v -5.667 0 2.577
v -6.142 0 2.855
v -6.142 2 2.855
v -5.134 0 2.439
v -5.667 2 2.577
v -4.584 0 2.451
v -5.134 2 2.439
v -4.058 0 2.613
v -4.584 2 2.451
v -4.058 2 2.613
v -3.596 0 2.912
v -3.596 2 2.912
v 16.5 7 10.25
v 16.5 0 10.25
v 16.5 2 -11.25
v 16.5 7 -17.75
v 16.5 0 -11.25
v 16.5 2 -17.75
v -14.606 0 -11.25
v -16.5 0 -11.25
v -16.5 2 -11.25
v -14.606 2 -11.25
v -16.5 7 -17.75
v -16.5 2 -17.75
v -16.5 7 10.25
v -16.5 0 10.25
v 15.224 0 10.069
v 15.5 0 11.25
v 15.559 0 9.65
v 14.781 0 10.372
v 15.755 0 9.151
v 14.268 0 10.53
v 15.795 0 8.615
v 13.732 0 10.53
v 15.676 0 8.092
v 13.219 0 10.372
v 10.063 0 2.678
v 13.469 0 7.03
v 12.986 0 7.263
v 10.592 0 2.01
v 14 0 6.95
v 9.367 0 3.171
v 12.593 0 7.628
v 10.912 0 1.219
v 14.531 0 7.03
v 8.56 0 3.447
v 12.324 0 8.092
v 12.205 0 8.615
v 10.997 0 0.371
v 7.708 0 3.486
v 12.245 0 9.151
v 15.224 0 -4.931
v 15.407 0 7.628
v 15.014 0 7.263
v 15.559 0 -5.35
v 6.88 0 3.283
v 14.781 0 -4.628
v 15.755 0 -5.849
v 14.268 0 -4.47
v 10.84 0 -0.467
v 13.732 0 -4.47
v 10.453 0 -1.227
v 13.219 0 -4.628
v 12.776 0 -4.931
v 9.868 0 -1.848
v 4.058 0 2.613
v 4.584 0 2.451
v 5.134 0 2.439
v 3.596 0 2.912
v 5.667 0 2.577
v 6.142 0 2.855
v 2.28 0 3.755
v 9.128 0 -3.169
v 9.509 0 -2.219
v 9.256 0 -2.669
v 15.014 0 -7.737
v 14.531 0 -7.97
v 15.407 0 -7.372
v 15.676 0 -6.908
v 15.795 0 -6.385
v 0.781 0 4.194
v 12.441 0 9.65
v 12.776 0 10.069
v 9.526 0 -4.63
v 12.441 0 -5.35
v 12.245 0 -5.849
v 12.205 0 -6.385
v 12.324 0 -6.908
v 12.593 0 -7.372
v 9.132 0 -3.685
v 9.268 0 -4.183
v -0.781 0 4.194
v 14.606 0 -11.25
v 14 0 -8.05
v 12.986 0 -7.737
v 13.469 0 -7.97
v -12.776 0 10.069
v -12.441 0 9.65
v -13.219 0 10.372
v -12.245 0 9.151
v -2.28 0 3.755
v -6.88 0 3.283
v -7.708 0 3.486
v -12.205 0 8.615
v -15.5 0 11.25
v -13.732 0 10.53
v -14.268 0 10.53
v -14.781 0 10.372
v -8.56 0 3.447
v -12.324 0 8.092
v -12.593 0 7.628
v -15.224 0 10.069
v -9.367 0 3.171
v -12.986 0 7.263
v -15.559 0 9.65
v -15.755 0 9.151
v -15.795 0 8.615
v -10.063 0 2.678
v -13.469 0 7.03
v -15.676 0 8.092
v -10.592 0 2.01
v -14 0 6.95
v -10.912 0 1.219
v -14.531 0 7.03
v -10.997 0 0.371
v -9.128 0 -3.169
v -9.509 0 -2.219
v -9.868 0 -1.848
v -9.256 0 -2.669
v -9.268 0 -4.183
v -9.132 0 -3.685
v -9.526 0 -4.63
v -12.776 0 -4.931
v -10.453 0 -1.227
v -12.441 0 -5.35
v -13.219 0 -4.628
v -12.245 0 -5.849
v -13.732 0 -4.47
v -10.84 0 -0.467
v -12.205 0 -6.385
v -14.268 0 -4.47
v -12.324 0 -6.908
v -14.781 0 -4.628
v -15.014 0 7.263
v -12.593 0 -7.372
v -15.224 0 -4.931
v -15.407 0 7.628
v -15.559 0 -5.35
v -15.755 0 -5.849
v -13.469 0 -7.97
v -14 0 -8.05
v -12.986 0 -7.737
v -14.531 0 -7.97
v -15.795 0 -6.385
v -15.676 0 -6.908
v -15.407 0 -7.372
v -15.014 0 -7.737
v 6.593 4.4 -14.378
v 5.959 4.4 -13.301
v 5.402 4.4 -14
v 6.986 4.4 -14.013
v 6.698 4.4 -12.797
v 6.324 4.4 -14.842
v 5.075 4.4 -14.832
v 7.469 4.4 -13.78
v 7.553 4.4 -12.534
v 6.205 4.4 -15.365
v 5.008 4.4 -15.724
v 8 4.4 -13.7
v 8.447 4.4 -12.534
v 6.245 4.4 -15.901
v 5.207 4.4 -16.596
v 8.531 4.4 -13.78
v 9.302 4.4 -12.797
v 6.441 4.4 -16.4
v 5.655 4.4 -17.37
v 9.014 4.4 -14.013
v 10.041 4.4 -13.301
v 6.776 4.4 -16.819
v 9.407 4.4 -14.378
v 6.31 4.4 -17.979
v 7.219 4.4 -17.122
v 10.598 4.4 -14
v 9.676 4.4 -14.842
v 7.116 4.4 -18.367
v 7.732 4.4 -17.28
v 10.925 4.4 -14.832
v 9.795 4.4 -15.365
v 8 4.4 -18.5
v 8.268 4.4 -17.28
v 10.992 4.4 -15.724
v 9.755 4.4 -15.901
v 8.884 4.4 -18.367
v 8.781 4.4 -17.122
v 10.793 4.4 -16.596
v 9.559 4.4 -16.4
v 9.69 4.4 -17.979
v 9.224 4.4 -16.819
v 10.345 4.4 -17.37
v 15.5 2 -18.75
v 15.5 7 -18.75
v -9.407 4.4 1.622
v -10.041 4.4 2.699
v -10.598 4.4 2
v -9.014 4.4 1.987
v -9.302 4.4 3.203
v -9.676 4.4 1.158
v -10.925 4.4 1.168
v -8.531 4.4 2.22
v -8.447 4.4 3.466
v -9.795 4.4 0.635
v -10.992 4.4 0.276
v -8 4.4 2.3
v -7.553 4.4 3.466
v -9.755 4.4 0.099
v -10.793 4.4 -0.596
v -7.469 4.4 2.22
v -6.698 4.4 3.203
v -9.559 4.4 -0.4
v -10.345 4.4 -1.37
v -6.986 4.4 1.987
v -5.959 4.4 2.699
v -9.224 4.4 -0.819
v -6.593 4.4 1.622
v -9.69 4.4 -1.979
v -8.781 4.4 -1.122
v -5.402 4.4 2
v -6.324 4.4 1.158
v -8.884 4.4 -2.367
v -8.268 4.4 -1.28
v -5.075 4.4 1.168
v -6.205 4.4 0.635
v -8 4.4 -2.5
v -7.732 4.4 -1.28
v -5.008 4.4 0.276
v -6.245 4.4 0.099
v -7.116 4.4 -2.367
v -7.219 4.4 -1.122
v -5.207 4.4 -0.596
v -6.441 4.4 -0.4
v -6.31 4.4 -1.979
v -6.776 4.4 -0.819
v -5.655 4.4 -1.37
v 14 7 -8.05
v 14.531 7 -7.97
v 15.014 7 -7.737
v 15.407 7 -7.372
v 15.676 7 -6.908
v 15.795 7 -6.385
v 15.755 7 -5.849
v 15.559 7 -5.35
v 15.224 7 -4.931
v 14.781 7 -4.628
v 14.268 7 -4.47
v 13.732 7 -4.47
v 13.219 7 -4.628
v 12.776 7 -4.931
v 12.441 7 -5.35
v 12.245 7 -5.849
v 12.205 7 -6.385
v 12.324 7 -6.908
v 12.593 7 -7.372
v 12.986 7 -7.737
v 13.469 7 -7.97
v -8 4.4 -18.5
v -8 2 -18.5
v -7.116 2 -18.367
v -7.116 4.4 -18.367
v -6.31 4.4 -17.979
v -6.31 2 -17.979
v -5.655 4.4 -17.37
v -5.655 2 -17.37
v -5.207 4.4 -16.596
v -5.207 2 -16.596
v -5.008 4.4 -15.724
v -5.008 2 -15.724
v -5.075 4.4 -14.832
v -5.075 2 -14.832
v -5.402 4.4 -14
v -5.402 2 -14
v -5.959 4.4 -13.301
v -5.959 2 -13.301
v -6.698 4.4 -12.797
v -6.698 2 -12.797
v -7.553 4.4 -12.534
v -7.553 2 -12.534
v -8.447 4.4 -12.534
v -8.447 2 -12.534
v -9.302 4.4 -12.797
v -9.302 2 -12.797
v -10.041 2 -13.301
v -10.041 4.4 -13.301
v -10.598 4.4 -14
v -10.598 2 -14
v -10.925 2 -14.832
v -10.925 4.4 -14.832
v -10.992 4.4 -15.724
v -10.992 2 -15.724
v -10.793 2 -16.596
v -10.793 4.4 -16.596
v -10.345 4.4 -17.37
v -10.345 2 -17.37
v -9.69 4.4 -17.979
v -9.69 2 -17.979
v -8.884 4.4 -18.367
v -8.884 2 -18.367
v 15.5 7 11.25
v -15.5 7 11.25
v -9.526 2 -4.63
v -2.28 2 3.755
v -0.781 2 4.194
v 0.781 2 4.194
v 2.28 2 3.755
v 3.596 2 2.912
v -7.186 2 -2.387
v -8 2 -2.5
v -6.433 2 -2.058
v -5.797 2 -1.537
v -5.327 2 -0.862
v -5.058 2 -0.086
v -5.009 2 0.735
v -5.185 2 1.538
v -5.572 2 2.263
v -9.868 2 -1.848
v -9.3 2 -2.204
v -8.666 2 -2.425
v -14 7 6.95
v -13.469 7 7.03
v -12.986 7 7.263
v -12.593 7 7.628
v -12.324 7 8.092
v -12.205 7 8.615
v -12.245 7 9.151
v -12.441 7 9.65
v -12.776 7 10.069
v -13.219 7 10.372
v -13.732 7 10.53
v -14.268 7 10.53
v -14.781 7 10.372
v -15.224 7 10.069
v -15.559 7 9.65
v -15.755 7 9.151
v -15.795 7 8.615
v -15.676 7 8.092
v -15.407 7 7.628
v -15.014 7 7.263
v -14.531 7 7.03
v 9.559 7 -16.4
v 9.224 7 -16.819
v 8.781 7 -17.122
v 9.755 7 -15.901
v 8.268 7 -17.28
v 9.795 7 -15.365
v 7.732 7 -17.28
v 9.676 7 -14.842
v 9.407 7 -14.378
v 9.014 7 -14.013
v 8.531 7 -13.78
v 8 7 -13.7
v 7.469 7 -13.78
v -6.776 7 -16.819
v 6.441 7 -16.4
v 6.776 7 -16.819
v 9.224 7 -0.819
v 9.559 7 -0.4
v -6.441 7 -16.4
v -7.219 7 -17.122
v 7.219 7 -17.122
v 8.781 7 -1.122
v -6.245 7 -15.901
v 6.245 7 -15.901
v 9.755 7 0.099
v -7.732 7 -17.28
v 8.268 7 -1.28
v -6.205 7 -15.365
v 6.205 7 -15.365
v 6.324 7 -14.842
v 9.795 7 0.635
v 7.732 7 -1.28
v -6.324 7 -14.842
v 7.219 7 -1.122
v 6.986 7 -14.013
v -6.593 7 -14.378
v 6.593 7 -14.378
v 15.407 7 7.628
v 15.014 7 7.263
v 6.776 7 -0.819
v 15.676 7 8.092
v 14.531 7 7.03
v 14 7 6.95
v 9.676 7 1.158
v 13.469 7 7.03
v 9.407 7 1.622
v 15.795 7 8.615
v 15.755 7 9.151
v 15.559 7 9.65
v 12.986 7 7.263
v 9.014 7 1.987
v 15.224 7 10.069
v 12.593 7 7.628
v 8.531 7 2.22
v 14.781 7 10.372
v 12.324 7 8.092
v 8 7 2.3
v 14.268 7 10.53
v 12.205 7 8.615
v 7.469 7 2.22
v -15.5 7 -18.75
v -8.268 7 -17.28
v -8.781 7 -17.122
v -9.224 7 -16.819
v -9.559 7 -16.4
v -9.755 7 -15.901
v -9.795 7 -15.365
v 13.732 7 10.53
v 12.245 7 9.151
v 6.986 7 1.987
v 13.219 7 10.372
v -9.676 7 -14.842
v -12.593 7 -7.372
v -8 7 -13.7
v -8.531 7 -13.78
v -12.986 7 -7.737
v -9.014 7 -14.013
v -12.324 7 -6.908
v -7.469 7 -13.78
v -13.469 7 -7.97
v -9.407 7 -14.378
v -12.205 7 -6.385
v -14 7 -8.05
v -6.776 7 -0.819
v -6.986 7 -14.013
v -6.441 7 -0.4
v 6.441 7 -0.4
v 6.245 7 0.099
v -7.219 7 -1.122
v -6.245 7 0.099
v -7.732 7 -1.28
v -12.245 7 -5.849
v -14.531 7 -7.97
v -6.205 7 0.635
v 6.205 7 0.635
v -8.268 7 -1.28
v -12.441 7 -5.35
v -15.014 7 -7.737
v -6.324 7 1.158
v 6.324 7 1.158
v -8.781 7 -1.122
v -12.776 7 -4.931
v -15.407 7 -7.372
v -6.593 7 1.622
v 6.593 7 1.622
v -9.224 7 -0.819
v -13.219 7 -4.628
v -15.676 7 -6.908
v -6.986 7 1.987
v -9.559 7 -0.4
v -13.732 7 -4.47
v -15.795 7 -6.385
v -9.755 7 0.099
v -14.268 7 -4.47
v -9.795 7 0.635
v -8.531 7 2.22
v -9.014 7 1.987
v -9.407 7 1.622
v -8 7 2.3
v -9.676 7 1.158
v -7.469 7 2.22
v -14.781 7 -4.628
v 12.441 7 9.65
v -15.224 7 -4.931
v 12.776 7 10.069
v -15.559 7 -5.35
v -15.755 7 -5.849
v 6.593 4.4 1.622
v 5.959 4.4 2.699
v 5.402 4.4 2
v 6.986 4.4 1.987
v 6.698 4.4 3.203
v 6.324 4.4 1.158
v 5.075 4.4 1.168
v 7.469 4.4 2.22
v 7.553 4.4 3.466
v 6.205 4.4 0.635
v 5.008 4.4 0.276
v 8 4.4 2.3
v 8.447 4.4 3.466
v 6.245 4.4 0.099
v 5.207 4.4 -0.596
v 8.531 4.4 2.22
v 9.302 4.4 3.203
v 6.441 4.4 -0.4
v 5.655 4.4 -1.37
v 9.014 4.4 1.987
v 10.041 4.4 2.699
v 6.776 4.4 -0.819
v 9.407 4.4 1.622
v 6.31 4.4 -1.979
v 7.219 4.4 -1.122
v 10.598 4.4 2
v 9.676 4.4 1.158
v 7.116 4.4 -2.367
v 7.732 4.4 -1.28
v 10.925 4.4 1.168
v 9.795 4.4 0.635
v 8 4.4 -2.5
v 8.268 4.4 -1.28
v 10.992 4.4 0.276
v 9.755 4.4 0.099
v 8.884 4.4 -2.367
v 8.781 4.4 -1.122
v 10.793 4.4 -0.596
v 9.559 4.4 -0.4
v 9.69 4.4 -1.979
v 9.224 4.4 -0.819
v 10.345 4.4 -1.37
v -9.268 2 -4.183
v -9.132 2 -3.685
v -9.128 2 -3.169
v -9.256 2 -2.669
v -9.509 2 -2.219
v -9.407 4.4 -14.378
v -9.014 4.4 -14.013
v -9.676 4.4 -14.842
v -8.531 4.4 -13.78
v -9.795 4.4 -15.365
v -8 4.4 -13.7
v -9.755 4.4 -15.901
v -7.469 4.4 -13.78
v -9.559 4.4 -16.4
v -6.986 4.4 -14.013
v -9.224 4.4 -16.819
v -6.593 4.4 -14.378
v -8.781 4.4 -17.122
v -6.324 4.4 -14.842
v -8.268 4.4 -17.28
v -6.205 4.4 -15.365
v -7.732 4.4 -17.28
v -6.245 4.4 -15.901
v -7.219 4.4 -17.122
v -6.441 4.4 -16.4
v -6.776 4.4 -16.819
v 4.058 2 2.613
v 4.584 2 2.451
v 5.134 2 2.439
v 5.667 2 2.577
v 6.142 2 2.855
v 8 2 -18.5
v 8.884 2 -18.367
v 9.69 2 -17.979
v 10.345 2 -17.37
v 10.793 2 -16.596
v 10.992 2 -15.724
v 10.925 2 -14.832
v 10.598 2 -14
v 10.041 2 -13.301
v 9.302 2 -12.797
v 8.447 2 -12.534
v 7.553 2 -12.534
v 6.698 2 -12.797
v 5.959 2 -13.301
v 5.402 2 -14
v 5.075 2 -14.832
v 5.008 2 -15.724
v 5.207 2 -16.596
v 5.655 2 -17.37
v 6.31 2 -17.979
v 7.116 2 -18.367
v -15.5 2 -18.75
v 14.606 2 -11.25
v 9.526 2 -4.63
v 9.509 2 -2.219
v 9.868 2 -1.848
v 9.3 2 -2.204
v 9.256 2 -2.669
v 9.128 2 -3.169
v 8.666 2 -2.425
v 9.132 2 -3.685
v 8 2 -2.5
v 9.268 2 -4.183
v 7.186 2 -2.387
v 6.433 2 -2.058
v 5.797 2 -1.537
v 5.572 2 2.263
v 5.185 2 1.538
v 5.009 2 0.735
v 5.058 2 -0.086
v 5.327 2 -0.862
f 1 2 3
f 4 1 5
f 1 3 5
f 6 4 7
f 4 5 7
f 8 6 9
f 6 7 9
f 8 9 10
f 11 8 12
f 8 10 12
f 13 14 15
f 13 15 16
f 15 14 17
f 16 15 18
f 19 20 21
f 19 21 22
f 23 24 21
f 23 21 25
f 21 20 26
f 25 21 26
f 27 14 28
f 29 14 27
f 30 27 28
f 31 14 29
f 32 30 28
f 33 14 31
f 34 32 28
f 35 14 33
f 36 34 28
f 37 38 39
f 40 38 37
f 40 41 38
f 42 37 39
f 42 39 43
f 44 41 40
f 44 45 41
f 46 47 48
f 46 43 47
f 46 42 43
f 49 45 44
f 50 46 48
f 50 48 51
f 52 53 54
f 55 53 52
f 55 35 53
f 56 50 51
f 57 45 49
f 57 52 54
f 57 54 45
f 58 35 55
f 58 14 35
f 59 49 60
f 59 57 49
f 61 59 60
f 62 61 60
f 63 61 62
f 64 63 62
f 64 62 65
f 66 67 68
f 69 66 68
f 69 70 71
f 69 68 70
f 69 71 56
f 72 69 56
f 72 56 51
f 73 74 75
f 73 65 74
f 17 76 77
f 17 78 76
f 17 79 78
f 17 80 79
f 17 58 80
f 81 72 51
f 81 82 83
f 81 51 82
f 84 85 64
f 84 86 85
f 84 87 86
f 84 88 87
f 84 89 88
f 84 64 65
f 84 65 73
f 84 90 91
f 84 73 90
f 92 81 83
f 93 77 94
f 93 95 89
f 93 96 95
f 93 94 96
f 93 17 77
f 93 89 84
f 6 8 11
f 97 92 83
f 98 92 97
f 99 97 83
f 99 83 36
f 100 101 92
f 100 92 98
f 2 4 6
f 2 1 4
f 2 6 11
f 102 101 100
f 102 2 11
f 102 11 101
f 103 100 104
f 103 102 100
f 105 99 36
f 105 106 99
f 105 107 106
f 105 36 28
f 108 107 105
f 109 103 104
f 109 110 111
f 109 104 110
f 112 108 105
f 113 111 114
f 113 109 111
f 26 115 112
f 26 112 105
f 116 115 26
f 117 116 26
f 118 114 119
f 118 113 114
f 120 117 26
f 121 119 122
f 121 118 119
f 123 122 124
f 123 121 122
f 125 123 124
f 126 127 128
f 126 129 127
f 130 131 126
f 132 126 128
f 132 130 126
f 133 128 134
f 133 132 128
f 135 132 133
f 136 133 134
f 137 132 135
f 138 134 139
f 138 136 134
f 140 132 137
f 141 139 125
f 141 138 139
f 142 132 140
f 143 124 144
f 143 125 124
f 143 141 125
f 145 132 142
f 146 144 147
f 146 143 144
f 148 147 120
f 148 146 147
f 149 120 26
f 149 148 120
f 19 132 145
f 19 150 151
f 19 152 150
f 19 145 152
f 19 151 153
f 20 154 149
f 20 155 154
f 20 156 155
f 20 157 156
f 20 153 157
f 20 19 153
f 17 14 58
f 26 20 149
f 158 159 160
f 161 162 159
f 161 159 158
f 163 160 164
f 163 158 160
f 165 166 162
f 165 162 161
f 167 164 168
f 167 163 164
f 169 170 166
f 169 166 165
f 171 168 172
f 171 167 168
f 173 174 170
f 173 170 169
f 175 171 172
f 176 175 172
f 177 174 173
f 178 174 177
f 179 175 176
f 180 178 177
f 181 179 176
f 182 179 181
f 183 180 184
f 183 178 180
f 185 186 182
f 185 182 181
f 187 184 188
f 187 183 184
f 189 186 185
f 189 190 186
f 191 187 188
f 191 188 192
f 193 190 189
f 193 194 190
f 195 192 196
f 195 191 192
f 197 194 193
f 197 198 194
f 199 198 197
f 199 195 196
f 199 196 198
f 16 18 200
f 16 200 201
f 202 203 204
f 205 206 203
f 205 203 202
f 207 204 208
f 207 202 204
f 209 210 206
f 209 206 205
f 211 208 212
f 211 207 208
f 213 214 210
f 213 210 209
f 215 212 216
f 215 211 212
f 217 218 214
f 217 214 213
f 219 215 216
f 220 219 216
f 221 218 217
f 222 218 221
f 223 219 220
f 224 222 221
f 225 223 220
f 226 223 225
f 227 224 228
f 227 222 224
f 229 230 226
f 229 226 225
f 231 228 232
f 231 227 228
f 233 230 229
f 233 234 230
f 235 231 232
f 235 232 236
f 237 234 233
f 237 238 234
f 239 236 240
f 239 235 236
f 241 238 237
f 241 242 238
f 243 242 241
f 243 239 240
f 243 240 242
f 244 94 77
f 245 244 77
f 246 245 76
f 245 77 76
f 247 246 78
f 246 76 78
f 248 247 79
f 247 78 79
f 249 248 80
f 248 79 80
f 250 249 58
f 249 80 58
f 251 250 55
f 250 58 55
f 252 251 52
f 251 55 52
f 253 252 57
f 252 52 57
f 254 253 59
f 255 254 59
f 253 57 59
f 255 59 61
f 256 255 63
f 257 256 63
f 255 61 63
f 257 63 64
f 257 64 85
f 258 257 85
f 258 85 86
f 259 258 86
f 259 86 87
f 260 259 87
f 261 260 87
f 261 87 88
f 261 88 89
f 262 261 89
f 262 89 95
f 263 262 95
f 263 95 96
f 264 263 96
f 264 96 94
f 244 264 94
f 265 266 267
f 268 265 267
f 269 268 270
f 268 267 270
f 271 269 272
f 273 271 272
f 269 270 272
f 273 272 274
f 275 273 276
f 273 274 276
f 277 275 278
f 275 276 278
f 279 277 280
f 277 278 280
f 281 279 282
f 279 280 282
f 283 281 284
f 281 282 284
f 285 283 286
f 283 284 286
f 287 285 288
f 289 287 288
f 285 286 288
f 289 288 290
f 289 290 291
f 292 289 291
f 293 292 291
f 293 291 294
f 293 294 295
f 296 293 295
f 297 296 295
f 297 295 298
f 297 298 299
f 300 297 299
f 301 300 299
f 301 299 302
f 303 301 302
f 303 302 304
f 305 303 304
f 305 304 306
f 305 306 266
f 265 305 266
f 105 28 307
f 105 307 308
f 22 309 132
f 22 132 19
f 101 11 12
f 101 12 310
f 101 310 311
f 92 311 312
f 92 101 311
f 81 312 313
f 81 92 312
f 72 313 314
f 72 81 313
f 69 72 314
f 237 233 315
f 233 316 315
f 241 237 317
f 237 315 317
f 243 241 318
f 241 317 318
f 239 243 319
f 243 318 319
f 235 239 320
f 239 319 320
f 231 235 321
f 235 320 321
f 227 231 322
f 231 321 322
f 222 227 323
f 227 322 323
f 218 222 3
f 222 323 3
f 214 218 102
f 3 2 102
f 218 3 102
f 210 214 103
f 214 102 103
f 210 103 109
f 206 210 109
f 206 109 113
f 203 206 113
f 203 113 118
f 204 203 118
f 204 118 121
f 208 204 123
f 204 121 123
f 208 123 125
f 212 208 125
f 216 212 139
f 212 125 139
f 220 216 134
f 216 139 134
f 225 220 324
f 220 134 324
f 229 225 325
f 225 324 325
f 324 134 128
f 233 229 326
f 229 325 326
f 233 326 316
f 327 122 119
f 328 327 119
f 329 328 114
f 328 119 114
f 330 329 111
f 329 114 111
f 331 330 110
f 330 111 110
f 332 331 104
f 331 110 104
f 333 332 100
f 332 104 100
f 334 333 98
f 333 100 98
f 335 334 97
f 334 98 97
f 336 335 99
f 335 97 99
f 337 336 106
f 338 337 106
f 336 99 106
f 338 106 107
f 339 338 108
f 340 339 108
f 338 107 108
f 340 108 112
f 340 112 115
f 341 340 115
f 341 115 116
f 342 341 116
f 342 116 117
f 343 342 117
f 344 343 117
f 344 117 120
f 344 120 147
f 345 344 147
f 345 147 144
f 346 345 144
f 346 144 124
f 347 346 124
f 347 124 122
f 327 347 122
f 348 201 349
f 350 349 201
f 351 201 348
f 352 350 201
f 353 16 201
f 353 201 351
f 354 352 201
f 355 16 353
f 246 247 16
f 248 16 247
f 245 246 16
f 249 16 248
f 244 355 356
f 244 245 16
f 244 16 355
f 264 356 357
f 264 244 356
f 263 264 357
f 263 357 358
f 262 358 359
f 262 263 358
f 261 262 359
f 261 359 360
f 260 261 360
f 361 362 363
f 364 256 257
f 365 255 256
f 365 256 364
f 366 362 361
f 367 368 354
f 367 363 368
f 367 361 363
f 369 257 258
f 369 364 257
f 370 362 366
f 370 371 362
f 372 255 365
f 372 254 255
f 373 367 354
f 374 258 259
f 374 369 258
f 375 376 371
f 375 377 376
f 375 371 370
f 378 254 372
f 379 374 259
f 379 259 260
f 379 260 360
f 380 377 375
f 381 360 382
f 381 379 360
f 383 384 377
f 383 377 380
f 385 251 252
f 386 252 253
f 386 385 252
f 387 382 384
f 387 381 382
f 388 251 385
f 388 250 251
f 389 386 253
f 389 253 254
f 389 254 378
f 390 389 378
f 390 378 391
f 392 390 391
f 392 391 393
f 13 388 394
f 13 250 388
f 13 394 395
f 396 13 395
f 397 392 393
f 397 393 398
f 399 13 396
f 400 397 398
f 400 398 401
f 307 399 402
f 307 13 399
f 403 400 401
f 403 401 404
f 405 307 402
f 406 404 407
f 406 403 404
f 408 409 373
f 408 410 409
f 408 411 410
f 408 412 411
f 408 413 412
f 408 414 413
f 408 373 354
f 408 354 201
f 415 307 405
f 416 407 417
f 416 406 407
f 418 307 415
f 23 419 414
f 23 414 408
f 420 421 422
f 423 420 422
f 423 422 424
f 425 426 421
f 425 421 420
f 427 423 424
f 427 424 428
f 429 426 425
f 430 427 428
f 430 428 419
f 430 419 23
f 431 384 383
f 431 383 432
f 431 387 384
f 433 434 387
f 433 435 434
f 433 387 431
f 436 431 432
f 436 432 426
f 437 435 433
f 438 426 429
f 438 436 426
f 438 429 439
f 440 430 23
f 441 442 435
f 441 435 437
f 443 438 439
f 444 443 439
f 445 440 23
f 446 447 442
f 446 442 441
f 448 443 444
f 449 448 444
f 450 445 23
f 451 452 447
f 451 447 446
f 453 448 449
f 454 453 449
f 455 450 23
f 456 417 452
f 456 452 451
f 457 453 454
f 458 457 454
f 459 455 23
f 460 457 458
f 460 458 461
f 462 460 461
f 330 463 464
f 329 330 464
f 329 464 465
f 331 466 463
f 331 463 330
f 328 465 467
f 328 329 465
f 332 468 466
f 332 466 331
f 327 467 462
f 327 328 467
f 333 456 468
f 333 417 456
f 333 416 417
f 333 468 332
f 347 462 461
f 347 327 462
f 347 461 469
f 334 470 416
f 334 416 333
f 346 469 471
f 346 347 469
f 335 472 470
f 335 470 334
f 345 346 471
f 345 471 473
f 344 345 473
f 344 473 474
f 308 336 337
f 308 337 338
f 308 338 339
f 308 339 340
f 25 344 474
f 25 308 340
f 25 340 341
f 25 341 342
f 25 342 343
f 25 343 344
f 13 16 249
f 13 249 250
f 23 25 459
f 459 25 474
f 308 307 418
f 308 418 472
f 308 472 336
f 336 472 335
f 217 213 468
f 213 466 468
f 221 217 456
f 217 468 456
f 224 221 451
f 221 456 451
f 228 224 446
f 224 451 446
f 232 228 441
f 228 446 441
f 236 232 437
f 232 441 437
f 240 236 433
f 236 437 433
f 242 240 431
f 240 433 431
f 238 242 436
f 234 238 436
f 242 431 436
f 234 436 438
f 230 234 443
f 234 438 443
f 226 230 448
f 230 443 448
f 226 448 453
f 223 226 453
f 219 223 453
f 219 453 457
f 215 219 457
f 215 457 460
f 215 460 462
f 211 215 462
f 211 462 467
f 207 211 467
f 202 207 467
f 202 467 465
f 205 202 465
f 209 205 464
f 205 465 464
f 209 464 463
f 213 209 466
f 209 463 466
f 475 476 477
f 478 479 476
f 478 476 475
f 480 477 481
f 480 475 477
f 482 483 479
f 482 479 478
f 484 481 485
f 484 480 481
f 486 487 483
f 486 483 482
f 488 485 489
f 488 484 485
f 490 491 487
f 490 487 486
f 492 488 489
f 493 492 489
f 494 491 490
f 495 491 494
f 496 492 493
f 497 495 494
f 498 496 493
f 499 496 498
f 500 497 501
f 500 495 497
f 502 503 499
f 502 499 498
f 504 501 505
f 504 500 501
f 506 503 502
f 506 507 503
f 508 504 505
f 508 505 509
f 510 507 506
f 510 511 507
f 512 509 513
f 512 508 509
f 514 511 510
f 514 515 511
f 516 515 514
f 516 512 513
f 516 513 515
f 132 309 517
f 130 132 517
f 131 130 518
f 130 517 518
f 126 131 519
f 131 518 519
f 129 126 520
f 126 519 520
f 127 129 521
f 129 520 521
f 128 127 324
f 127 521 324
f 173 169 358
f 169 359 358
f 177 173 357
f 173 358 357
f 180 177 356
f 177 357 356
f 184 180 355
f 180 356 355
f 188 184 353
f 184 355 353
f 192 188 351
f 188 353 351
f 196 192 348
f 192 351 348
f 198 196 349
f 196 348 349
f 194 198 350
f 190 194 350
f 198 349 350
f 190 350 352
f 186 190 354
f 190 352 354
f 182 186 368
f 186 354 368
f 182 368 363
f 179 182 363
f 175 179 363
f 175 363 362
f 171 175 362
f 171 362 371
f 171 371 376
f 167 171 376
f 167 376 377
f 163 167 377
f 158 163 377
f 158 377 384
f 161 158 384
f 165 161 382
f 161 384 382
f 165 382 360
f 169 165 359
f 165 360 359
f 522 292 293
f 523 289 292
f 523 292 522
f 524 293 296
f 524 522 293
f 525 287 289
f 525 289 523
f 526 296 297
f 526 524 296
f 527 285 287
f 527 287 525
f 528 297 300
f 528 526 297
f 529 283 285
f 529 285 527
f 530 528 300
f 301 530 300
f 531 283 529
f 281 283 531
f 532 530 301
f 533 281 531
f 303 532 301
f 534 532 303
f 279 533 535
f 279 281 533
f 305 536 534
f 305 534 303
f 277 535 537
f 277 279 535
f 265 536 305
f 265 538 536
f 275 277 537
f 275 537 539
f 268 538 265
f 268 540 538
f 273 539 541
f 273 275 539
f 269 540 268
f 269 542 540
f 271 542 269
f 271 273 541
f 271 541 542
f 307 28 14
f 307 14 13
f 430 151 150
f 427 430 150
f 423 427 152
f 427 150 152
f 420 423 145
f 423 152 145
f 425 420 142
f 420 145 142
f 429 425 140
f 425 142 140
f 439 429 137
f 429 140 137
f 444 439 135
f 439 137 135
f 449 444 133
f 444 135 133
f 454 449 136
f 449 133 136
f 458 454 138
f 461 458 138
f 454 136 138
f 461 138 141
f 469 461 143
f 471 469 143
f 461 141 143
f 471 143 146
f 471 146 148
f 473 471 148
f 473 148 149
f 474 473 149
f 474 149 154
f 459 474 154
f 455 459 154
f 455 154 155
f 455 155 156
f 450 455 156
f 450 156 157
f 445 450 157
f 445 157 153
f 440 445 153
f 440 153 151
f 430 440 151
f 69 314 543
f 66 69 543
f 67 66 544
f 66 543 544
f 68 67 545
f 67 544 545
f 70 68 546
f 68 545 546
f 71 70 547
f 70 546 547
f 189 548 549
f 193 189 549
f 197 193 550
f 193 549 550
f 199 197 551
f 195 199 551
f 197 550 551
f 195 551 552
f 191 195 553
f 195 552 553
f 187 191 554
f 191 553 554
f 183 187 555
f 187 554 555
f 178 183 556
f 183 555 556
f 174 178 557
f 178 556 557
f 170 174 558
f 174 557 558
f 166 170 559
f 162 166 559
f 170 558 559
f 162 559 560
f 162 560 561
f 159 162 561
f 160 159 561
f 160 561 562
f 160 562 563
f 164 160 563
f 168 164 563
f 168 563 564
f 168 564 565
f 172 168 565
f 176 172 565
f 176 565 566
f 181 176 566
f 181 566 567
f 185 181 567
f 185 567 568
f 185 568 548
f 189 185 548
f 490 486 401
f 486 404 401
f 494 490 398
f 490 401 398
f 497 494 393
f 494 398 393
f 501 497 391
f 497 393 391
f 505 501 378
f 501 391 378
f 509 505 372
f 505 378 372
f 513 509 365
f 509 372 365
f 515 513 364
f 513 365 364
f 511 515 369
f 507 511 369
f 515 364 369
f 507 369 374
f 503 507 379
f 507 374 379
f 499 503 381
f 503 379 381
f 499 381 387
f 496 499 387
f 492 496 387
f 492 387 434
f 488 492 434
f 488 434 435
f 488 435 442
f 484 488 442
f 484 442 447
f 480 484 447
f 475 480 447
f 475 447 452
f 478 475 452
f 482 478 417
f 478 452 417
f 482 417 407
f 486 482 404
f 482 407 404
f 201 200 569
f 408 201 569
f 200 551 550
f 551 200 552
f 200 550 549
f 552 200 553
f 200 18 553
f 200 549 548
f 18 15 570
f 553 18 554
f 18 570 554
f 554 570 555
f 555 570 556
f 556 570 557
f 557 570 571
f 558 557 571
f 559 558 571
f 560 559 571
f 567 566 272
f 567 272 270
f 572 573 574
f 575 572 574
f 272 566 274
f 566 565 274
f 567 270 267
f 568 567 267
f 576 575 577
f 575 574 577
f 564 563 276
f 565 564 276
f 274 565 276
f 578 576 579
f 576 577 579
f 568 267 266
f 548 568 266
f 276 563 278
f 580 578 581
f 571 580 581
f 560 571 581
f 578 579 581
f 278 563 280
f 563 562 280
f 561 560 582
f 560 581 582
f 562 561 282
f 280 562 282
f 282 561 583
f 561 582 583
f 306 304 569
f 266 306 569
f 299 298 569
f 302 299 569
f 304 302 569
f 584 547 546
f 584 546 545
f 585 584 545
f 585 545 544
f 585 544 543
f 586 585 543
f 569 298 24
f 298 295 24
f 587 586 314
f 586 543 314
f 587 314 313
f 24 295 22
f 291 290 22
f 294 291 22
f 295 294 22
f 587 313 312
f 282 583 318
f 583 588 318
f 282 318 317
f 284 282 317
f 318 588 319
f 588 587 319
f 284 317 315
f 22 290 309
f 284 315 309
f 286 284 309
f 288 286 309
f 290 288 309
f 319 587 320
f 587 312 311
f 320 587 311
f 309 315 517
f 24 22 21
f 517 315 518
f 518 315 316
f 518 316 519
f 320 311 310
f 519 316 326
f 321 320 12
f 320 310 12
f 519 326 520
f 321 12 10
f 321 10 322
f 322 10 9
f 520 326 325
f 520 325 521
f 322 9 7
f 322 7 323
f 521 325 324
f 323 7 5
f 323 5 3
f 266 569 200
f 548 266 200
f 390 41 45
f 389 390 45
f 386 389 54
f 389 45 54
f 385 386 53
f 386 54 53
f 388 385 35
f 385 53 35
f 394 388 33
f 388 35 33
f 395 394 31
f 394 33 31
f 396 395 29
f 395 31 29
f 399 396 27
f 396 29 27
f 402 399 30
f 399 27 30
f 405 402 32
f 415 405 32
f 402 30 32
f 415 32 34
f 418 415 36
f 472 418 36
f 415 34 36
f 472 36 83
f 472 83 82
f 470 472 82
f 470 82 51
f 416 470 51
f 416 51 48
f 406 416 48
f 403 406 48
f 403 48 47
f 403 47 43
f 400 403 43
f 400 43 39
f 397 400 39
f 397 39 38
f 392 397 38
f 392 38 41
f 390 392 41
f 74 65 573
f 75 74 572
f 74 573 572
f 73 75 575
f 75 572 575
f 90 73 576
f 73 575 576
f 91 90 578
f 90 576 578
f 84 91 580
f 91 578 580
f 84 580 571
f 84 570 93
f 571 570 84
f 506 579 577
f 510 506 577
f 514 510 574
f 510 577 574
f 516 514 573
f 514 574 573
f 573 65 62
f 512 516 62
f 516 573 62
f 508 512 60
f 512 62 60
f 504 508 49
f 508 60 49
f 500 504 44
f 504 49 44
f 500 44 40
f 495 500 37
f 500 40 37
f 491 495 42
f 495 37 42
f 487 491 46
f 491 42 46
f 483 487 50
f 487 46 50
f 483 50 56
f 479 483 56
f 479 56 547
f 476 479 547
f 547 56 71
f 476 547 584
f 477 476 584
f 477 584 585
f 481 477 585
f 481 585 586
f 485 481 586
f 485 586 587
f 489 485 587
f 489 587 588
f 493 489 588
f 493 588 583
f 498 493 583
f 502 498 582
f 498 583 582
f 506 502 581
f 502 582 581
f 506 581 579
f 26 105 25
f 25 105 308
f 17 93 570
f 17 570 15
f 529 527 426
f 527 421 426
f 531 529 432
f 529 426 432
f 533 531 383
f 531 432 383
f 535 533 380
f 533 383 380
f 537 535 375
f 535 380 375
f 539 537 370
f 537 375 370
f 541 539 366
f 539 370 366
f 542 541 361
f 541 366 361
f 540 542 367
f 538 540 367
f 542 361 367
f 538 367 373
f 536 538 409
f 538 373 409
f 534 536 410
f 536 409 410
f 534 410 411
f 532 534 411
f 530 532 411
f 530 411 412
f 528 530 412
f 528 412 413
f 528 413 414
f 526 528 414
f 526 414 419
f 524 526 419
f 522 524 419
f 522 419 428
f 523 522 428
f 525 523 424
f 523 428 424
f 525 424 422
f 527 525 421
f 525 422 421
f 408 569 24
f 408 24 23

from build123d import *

# Parameters (mm, degrees)
BOSS_EXTRUDE1_DEPTH                                  = 7
M3_CLEARANCE_HOLE1_D                                 = 3.6
CUT_EXTRUDE1_DEPTH                                   = 22.16158075380949
CUT_EXTRUDE1_DEPTH_BACK                              = 2
BOSS_EXTRUDE2_DEPTH                                  = 5
FILLET1_R                                            = 5.5
CHAMFER1_SIZE                                        = 1
CBORE_FOR_M3_HEXAGON_SOCKET_HEAD_CAP_SCR_D           = 3.6
CBORE_FOR_M3_HEXAGON_SOCKET_HEAD_CAP_SCR_CBORE_D     = 6
CBORE_FOR_M3_HEXAGON_SOCKET_HEAD_CAP_SCR_CBORE_DEPTH = 4.4
FILLET2_R                                            = 2


with BuildPart() as part:
    # Sketch1 → Boss-Extrude1 (new body)
    with BuildSketch(Plane(origin=(0, 0, 0), x_dir=(1, 0, 0), z_dir=(0, 1, 0))):
        Polygon((16.5, -11.249999999999996), (-16.499999999999996, -11.250000000000002), (-16.499999999999996, 11.249999999999998), (16.500000000000004, 11.250000000000002), align=None)
    extrude(amount=BOSS_EXTRUDE1_DEPTH)

    # M3 Clearance Hole1 (through all)
    with Locations(Plane(origin=(-14, 7, -6.25), x_dir=(0, 0, 1), z_dir=(0, 1, 0))):
        with Locations((0, 0), (0, 28), (15, 28), (15, 0)):
            Hole(M3_CLEARANCE_HOLE1_D / 2)

    # Sketch7 → Cut-Extrude1 (cut, two sides: drawn at the far end of the back side and taken through both)
    with BuildSketch(Plane.XZ.offset(-CUT_EXTRUDE1_DEPTH_BACK)):
        Polygon((-1.78e-15, 7.784737974375178), (-14.605868156846089, -11.250000000000002), (14.605868156846089, -11.250000000000002), align=None)
    extrude(amount=CUT_EXTRUDE1_DEPTH + CUT_EXTRUDE1_DEPTH_BACK, mode=Mode.SUBTRACT)

    # Sketch8 → Boss-Extrude2 (add)
    with BuildSketch(Plane.XZ.offset(-2)):
        Polygon((-16.499999999999996, -11.249999999999998), (16.500000000000004, -11.250000000000002), (16.500000000000004, -18.749999999999996), (-16.499999999999996, -18.749999999999996), align=None)
    extrude(amount=-BOSS_EXTRUDE2_DEPTH)

    # Fillet1
    fillet1_edges = [part.edges().sort_by_distance(p)[0] for p in [
        (0, 1, 7.784737974375178),
    ]]
    fillet(fillet1_edges, radius=FILLET1_R)

    # Chamfer1
    chamfer1_edges = [part.edges().sort_by_distance(p)[0] for p in [
        (16.500000000000004, 4.5, -18.749999999999996),
        (-16.499999999999996, 4.5, -18.749999999999996),
        (16.5, 3.5, 11.249999999999996),
        (-16.499999999999996, 3.5, 11.250000000000002),
    ]]
    chamfer(chamfer1_edges, length=CHAMFER1_SIZE)

    # CBORE for M3 Hexagon socket head cap screws1 (through all)
    with Locations(Plane(origin=(-8, 0, 0.5), x_dir=(0, 0, -1), z_dir=(0, -1, 0))):
        with Locations((0, 0), (0, 16), (16, 0), (16, 16)):
            CounterBoreHole(CBORE_FOR_M3_HEXAGON_SOCKET_HEAD_CAP_SCR_D / 2, CBORE_FOR_M3_HEXAGON_SOCKET_HEAD_CAP_SCR_CBORE_D / 2, CBORE_FOR_M3_HEXAGON_SOCKET_HEAD_CAP_SCR_CBORE_DEPTH)

    # Fillet2
    # the kernel refuses this fillet: 2 mm, written as the material it takes off along each edge
    with BuildSketch(Plane(origin=(7.890215098826709, 2, -2.497990539590539), x_dir=(0.6087614290087221, 0, -0.793353340291234), z_dir=(0, -1, 0))) as fillet2_piece_1:
        with BuildLine():
            CenterArc((2.6875953448217693, 1.9999999999999998), FILLET2_R, 181.00663294290118, 88.9933670570988)
            ThreePointArc((0.6879040087236102, 1.9648636892380578), (0.5198514245240395, 0.9208489893174272), (0, 0))
            Line((0, 0), (2.687595344821769, -6e-17))
        make_face()
    extrude(amount=8.718988362054422, mode=Mode.SUBTRACT)
    with BuildSketch(Plane(origin=(5.075749087550851, 2, 1.169892977303331), x_dir=(0.5345809158392569, 0, 0.8451172962497344), z_dir=(0, -1, 0))) as fillet2_piece_2:
        with BuildLine():
            CenterArc((2.658961571108191, 1.8862980173372965), FILLET2_R, 171.49145576395077, 79.09584417917802)
            Line((0.6809739505501902, 2.182211810390776), (0.48317518849439006, 2.2118031896961234))
            ThreePointArc((0.48317518849439006, 2.2118031896961234), (0.21601574537907067, 1.167239486619447), (-0.18771727363639942, 0.06900887753410519))
            Line((-0.18771727363639942, 0.06900887753410519), (0.06647403927770486, -0.18862980173372967))
            ThreePointArc((0.06647403927770486, -0.18862980173372967), (0.9971105891655724, -0.02944702600594452), (1.9277471390534389, -0.18862980173372967))
            Line((1.9277471390534389, -0.18862980173372967), (1.9942211783311437, -1.1e-16))
        make_face()
    extrude(amount=7.714987919244077, mode=Mode.SUBTRACT)
    with BuildSketch(Plane(origin=(-5.075749087550852, 2, 1.169892977303333), x_dir=(0.6475032352688438, 0, 0.76206270104), z_dir=(0, -1, 0))) as fillet2_piece_3:
        with BuildLine():
            CenterArc((2.5927374915549515, 1.9763373059158453), FILLET2_R, 182.08181462888786, 79.09584417902704)
            Line((0.594057543639052, 1.9036842550583746), (0.39418954884746193, 1.8964189499726276))
            ThreePointArc((0.39418954884746193, 1.8964189499726276), (0.2689186301864014, 0.960614087293723), (-0.16026415854934645, 0.11964697858479319))
            Line((-0.16026415854934645, 0.11964697858479319), (0.00995689513411226, -0.19975199683429518))
            ThreePointArc((0.00995689513411226, -0.19975199683429518), (1.1785960560365805, -0.14149967515975187), (2.2553209353120622, -0.19763373059158465))
            Line((2.2553209353120622, -0.19763373059158465), (2.2859951676977794, 3e-17))
        make_face()
    extrude(amount=7.714987919244448, mode=Mode.SUBTRACT)
    with BuildSketch(Plane(origin=(-7.890215098826712, 2, -2.497990539590539), x_dir=(-0.9499463523512466, 0, 0.3124130721569783), z_dir=(0, -1, 0))) as fillet2_piece_4:
        with BuildLine():
            CenterArc((2.7757365364902538, 1.8757546261437203), FILLET2_R, 160.70471375400504, 88.99336705710107)
            Line((0.8880802565250356, 2.53662811532896), (0, 0))
            ThreePointArc((0, 0), (1.040901201183847, 0.18636806078441912), (2.0818024023676904, -4e-17))
        make_face()
    extrude(amount=8.718988362054088, mode=Mode.SUBTRACT)


solid = part.part
